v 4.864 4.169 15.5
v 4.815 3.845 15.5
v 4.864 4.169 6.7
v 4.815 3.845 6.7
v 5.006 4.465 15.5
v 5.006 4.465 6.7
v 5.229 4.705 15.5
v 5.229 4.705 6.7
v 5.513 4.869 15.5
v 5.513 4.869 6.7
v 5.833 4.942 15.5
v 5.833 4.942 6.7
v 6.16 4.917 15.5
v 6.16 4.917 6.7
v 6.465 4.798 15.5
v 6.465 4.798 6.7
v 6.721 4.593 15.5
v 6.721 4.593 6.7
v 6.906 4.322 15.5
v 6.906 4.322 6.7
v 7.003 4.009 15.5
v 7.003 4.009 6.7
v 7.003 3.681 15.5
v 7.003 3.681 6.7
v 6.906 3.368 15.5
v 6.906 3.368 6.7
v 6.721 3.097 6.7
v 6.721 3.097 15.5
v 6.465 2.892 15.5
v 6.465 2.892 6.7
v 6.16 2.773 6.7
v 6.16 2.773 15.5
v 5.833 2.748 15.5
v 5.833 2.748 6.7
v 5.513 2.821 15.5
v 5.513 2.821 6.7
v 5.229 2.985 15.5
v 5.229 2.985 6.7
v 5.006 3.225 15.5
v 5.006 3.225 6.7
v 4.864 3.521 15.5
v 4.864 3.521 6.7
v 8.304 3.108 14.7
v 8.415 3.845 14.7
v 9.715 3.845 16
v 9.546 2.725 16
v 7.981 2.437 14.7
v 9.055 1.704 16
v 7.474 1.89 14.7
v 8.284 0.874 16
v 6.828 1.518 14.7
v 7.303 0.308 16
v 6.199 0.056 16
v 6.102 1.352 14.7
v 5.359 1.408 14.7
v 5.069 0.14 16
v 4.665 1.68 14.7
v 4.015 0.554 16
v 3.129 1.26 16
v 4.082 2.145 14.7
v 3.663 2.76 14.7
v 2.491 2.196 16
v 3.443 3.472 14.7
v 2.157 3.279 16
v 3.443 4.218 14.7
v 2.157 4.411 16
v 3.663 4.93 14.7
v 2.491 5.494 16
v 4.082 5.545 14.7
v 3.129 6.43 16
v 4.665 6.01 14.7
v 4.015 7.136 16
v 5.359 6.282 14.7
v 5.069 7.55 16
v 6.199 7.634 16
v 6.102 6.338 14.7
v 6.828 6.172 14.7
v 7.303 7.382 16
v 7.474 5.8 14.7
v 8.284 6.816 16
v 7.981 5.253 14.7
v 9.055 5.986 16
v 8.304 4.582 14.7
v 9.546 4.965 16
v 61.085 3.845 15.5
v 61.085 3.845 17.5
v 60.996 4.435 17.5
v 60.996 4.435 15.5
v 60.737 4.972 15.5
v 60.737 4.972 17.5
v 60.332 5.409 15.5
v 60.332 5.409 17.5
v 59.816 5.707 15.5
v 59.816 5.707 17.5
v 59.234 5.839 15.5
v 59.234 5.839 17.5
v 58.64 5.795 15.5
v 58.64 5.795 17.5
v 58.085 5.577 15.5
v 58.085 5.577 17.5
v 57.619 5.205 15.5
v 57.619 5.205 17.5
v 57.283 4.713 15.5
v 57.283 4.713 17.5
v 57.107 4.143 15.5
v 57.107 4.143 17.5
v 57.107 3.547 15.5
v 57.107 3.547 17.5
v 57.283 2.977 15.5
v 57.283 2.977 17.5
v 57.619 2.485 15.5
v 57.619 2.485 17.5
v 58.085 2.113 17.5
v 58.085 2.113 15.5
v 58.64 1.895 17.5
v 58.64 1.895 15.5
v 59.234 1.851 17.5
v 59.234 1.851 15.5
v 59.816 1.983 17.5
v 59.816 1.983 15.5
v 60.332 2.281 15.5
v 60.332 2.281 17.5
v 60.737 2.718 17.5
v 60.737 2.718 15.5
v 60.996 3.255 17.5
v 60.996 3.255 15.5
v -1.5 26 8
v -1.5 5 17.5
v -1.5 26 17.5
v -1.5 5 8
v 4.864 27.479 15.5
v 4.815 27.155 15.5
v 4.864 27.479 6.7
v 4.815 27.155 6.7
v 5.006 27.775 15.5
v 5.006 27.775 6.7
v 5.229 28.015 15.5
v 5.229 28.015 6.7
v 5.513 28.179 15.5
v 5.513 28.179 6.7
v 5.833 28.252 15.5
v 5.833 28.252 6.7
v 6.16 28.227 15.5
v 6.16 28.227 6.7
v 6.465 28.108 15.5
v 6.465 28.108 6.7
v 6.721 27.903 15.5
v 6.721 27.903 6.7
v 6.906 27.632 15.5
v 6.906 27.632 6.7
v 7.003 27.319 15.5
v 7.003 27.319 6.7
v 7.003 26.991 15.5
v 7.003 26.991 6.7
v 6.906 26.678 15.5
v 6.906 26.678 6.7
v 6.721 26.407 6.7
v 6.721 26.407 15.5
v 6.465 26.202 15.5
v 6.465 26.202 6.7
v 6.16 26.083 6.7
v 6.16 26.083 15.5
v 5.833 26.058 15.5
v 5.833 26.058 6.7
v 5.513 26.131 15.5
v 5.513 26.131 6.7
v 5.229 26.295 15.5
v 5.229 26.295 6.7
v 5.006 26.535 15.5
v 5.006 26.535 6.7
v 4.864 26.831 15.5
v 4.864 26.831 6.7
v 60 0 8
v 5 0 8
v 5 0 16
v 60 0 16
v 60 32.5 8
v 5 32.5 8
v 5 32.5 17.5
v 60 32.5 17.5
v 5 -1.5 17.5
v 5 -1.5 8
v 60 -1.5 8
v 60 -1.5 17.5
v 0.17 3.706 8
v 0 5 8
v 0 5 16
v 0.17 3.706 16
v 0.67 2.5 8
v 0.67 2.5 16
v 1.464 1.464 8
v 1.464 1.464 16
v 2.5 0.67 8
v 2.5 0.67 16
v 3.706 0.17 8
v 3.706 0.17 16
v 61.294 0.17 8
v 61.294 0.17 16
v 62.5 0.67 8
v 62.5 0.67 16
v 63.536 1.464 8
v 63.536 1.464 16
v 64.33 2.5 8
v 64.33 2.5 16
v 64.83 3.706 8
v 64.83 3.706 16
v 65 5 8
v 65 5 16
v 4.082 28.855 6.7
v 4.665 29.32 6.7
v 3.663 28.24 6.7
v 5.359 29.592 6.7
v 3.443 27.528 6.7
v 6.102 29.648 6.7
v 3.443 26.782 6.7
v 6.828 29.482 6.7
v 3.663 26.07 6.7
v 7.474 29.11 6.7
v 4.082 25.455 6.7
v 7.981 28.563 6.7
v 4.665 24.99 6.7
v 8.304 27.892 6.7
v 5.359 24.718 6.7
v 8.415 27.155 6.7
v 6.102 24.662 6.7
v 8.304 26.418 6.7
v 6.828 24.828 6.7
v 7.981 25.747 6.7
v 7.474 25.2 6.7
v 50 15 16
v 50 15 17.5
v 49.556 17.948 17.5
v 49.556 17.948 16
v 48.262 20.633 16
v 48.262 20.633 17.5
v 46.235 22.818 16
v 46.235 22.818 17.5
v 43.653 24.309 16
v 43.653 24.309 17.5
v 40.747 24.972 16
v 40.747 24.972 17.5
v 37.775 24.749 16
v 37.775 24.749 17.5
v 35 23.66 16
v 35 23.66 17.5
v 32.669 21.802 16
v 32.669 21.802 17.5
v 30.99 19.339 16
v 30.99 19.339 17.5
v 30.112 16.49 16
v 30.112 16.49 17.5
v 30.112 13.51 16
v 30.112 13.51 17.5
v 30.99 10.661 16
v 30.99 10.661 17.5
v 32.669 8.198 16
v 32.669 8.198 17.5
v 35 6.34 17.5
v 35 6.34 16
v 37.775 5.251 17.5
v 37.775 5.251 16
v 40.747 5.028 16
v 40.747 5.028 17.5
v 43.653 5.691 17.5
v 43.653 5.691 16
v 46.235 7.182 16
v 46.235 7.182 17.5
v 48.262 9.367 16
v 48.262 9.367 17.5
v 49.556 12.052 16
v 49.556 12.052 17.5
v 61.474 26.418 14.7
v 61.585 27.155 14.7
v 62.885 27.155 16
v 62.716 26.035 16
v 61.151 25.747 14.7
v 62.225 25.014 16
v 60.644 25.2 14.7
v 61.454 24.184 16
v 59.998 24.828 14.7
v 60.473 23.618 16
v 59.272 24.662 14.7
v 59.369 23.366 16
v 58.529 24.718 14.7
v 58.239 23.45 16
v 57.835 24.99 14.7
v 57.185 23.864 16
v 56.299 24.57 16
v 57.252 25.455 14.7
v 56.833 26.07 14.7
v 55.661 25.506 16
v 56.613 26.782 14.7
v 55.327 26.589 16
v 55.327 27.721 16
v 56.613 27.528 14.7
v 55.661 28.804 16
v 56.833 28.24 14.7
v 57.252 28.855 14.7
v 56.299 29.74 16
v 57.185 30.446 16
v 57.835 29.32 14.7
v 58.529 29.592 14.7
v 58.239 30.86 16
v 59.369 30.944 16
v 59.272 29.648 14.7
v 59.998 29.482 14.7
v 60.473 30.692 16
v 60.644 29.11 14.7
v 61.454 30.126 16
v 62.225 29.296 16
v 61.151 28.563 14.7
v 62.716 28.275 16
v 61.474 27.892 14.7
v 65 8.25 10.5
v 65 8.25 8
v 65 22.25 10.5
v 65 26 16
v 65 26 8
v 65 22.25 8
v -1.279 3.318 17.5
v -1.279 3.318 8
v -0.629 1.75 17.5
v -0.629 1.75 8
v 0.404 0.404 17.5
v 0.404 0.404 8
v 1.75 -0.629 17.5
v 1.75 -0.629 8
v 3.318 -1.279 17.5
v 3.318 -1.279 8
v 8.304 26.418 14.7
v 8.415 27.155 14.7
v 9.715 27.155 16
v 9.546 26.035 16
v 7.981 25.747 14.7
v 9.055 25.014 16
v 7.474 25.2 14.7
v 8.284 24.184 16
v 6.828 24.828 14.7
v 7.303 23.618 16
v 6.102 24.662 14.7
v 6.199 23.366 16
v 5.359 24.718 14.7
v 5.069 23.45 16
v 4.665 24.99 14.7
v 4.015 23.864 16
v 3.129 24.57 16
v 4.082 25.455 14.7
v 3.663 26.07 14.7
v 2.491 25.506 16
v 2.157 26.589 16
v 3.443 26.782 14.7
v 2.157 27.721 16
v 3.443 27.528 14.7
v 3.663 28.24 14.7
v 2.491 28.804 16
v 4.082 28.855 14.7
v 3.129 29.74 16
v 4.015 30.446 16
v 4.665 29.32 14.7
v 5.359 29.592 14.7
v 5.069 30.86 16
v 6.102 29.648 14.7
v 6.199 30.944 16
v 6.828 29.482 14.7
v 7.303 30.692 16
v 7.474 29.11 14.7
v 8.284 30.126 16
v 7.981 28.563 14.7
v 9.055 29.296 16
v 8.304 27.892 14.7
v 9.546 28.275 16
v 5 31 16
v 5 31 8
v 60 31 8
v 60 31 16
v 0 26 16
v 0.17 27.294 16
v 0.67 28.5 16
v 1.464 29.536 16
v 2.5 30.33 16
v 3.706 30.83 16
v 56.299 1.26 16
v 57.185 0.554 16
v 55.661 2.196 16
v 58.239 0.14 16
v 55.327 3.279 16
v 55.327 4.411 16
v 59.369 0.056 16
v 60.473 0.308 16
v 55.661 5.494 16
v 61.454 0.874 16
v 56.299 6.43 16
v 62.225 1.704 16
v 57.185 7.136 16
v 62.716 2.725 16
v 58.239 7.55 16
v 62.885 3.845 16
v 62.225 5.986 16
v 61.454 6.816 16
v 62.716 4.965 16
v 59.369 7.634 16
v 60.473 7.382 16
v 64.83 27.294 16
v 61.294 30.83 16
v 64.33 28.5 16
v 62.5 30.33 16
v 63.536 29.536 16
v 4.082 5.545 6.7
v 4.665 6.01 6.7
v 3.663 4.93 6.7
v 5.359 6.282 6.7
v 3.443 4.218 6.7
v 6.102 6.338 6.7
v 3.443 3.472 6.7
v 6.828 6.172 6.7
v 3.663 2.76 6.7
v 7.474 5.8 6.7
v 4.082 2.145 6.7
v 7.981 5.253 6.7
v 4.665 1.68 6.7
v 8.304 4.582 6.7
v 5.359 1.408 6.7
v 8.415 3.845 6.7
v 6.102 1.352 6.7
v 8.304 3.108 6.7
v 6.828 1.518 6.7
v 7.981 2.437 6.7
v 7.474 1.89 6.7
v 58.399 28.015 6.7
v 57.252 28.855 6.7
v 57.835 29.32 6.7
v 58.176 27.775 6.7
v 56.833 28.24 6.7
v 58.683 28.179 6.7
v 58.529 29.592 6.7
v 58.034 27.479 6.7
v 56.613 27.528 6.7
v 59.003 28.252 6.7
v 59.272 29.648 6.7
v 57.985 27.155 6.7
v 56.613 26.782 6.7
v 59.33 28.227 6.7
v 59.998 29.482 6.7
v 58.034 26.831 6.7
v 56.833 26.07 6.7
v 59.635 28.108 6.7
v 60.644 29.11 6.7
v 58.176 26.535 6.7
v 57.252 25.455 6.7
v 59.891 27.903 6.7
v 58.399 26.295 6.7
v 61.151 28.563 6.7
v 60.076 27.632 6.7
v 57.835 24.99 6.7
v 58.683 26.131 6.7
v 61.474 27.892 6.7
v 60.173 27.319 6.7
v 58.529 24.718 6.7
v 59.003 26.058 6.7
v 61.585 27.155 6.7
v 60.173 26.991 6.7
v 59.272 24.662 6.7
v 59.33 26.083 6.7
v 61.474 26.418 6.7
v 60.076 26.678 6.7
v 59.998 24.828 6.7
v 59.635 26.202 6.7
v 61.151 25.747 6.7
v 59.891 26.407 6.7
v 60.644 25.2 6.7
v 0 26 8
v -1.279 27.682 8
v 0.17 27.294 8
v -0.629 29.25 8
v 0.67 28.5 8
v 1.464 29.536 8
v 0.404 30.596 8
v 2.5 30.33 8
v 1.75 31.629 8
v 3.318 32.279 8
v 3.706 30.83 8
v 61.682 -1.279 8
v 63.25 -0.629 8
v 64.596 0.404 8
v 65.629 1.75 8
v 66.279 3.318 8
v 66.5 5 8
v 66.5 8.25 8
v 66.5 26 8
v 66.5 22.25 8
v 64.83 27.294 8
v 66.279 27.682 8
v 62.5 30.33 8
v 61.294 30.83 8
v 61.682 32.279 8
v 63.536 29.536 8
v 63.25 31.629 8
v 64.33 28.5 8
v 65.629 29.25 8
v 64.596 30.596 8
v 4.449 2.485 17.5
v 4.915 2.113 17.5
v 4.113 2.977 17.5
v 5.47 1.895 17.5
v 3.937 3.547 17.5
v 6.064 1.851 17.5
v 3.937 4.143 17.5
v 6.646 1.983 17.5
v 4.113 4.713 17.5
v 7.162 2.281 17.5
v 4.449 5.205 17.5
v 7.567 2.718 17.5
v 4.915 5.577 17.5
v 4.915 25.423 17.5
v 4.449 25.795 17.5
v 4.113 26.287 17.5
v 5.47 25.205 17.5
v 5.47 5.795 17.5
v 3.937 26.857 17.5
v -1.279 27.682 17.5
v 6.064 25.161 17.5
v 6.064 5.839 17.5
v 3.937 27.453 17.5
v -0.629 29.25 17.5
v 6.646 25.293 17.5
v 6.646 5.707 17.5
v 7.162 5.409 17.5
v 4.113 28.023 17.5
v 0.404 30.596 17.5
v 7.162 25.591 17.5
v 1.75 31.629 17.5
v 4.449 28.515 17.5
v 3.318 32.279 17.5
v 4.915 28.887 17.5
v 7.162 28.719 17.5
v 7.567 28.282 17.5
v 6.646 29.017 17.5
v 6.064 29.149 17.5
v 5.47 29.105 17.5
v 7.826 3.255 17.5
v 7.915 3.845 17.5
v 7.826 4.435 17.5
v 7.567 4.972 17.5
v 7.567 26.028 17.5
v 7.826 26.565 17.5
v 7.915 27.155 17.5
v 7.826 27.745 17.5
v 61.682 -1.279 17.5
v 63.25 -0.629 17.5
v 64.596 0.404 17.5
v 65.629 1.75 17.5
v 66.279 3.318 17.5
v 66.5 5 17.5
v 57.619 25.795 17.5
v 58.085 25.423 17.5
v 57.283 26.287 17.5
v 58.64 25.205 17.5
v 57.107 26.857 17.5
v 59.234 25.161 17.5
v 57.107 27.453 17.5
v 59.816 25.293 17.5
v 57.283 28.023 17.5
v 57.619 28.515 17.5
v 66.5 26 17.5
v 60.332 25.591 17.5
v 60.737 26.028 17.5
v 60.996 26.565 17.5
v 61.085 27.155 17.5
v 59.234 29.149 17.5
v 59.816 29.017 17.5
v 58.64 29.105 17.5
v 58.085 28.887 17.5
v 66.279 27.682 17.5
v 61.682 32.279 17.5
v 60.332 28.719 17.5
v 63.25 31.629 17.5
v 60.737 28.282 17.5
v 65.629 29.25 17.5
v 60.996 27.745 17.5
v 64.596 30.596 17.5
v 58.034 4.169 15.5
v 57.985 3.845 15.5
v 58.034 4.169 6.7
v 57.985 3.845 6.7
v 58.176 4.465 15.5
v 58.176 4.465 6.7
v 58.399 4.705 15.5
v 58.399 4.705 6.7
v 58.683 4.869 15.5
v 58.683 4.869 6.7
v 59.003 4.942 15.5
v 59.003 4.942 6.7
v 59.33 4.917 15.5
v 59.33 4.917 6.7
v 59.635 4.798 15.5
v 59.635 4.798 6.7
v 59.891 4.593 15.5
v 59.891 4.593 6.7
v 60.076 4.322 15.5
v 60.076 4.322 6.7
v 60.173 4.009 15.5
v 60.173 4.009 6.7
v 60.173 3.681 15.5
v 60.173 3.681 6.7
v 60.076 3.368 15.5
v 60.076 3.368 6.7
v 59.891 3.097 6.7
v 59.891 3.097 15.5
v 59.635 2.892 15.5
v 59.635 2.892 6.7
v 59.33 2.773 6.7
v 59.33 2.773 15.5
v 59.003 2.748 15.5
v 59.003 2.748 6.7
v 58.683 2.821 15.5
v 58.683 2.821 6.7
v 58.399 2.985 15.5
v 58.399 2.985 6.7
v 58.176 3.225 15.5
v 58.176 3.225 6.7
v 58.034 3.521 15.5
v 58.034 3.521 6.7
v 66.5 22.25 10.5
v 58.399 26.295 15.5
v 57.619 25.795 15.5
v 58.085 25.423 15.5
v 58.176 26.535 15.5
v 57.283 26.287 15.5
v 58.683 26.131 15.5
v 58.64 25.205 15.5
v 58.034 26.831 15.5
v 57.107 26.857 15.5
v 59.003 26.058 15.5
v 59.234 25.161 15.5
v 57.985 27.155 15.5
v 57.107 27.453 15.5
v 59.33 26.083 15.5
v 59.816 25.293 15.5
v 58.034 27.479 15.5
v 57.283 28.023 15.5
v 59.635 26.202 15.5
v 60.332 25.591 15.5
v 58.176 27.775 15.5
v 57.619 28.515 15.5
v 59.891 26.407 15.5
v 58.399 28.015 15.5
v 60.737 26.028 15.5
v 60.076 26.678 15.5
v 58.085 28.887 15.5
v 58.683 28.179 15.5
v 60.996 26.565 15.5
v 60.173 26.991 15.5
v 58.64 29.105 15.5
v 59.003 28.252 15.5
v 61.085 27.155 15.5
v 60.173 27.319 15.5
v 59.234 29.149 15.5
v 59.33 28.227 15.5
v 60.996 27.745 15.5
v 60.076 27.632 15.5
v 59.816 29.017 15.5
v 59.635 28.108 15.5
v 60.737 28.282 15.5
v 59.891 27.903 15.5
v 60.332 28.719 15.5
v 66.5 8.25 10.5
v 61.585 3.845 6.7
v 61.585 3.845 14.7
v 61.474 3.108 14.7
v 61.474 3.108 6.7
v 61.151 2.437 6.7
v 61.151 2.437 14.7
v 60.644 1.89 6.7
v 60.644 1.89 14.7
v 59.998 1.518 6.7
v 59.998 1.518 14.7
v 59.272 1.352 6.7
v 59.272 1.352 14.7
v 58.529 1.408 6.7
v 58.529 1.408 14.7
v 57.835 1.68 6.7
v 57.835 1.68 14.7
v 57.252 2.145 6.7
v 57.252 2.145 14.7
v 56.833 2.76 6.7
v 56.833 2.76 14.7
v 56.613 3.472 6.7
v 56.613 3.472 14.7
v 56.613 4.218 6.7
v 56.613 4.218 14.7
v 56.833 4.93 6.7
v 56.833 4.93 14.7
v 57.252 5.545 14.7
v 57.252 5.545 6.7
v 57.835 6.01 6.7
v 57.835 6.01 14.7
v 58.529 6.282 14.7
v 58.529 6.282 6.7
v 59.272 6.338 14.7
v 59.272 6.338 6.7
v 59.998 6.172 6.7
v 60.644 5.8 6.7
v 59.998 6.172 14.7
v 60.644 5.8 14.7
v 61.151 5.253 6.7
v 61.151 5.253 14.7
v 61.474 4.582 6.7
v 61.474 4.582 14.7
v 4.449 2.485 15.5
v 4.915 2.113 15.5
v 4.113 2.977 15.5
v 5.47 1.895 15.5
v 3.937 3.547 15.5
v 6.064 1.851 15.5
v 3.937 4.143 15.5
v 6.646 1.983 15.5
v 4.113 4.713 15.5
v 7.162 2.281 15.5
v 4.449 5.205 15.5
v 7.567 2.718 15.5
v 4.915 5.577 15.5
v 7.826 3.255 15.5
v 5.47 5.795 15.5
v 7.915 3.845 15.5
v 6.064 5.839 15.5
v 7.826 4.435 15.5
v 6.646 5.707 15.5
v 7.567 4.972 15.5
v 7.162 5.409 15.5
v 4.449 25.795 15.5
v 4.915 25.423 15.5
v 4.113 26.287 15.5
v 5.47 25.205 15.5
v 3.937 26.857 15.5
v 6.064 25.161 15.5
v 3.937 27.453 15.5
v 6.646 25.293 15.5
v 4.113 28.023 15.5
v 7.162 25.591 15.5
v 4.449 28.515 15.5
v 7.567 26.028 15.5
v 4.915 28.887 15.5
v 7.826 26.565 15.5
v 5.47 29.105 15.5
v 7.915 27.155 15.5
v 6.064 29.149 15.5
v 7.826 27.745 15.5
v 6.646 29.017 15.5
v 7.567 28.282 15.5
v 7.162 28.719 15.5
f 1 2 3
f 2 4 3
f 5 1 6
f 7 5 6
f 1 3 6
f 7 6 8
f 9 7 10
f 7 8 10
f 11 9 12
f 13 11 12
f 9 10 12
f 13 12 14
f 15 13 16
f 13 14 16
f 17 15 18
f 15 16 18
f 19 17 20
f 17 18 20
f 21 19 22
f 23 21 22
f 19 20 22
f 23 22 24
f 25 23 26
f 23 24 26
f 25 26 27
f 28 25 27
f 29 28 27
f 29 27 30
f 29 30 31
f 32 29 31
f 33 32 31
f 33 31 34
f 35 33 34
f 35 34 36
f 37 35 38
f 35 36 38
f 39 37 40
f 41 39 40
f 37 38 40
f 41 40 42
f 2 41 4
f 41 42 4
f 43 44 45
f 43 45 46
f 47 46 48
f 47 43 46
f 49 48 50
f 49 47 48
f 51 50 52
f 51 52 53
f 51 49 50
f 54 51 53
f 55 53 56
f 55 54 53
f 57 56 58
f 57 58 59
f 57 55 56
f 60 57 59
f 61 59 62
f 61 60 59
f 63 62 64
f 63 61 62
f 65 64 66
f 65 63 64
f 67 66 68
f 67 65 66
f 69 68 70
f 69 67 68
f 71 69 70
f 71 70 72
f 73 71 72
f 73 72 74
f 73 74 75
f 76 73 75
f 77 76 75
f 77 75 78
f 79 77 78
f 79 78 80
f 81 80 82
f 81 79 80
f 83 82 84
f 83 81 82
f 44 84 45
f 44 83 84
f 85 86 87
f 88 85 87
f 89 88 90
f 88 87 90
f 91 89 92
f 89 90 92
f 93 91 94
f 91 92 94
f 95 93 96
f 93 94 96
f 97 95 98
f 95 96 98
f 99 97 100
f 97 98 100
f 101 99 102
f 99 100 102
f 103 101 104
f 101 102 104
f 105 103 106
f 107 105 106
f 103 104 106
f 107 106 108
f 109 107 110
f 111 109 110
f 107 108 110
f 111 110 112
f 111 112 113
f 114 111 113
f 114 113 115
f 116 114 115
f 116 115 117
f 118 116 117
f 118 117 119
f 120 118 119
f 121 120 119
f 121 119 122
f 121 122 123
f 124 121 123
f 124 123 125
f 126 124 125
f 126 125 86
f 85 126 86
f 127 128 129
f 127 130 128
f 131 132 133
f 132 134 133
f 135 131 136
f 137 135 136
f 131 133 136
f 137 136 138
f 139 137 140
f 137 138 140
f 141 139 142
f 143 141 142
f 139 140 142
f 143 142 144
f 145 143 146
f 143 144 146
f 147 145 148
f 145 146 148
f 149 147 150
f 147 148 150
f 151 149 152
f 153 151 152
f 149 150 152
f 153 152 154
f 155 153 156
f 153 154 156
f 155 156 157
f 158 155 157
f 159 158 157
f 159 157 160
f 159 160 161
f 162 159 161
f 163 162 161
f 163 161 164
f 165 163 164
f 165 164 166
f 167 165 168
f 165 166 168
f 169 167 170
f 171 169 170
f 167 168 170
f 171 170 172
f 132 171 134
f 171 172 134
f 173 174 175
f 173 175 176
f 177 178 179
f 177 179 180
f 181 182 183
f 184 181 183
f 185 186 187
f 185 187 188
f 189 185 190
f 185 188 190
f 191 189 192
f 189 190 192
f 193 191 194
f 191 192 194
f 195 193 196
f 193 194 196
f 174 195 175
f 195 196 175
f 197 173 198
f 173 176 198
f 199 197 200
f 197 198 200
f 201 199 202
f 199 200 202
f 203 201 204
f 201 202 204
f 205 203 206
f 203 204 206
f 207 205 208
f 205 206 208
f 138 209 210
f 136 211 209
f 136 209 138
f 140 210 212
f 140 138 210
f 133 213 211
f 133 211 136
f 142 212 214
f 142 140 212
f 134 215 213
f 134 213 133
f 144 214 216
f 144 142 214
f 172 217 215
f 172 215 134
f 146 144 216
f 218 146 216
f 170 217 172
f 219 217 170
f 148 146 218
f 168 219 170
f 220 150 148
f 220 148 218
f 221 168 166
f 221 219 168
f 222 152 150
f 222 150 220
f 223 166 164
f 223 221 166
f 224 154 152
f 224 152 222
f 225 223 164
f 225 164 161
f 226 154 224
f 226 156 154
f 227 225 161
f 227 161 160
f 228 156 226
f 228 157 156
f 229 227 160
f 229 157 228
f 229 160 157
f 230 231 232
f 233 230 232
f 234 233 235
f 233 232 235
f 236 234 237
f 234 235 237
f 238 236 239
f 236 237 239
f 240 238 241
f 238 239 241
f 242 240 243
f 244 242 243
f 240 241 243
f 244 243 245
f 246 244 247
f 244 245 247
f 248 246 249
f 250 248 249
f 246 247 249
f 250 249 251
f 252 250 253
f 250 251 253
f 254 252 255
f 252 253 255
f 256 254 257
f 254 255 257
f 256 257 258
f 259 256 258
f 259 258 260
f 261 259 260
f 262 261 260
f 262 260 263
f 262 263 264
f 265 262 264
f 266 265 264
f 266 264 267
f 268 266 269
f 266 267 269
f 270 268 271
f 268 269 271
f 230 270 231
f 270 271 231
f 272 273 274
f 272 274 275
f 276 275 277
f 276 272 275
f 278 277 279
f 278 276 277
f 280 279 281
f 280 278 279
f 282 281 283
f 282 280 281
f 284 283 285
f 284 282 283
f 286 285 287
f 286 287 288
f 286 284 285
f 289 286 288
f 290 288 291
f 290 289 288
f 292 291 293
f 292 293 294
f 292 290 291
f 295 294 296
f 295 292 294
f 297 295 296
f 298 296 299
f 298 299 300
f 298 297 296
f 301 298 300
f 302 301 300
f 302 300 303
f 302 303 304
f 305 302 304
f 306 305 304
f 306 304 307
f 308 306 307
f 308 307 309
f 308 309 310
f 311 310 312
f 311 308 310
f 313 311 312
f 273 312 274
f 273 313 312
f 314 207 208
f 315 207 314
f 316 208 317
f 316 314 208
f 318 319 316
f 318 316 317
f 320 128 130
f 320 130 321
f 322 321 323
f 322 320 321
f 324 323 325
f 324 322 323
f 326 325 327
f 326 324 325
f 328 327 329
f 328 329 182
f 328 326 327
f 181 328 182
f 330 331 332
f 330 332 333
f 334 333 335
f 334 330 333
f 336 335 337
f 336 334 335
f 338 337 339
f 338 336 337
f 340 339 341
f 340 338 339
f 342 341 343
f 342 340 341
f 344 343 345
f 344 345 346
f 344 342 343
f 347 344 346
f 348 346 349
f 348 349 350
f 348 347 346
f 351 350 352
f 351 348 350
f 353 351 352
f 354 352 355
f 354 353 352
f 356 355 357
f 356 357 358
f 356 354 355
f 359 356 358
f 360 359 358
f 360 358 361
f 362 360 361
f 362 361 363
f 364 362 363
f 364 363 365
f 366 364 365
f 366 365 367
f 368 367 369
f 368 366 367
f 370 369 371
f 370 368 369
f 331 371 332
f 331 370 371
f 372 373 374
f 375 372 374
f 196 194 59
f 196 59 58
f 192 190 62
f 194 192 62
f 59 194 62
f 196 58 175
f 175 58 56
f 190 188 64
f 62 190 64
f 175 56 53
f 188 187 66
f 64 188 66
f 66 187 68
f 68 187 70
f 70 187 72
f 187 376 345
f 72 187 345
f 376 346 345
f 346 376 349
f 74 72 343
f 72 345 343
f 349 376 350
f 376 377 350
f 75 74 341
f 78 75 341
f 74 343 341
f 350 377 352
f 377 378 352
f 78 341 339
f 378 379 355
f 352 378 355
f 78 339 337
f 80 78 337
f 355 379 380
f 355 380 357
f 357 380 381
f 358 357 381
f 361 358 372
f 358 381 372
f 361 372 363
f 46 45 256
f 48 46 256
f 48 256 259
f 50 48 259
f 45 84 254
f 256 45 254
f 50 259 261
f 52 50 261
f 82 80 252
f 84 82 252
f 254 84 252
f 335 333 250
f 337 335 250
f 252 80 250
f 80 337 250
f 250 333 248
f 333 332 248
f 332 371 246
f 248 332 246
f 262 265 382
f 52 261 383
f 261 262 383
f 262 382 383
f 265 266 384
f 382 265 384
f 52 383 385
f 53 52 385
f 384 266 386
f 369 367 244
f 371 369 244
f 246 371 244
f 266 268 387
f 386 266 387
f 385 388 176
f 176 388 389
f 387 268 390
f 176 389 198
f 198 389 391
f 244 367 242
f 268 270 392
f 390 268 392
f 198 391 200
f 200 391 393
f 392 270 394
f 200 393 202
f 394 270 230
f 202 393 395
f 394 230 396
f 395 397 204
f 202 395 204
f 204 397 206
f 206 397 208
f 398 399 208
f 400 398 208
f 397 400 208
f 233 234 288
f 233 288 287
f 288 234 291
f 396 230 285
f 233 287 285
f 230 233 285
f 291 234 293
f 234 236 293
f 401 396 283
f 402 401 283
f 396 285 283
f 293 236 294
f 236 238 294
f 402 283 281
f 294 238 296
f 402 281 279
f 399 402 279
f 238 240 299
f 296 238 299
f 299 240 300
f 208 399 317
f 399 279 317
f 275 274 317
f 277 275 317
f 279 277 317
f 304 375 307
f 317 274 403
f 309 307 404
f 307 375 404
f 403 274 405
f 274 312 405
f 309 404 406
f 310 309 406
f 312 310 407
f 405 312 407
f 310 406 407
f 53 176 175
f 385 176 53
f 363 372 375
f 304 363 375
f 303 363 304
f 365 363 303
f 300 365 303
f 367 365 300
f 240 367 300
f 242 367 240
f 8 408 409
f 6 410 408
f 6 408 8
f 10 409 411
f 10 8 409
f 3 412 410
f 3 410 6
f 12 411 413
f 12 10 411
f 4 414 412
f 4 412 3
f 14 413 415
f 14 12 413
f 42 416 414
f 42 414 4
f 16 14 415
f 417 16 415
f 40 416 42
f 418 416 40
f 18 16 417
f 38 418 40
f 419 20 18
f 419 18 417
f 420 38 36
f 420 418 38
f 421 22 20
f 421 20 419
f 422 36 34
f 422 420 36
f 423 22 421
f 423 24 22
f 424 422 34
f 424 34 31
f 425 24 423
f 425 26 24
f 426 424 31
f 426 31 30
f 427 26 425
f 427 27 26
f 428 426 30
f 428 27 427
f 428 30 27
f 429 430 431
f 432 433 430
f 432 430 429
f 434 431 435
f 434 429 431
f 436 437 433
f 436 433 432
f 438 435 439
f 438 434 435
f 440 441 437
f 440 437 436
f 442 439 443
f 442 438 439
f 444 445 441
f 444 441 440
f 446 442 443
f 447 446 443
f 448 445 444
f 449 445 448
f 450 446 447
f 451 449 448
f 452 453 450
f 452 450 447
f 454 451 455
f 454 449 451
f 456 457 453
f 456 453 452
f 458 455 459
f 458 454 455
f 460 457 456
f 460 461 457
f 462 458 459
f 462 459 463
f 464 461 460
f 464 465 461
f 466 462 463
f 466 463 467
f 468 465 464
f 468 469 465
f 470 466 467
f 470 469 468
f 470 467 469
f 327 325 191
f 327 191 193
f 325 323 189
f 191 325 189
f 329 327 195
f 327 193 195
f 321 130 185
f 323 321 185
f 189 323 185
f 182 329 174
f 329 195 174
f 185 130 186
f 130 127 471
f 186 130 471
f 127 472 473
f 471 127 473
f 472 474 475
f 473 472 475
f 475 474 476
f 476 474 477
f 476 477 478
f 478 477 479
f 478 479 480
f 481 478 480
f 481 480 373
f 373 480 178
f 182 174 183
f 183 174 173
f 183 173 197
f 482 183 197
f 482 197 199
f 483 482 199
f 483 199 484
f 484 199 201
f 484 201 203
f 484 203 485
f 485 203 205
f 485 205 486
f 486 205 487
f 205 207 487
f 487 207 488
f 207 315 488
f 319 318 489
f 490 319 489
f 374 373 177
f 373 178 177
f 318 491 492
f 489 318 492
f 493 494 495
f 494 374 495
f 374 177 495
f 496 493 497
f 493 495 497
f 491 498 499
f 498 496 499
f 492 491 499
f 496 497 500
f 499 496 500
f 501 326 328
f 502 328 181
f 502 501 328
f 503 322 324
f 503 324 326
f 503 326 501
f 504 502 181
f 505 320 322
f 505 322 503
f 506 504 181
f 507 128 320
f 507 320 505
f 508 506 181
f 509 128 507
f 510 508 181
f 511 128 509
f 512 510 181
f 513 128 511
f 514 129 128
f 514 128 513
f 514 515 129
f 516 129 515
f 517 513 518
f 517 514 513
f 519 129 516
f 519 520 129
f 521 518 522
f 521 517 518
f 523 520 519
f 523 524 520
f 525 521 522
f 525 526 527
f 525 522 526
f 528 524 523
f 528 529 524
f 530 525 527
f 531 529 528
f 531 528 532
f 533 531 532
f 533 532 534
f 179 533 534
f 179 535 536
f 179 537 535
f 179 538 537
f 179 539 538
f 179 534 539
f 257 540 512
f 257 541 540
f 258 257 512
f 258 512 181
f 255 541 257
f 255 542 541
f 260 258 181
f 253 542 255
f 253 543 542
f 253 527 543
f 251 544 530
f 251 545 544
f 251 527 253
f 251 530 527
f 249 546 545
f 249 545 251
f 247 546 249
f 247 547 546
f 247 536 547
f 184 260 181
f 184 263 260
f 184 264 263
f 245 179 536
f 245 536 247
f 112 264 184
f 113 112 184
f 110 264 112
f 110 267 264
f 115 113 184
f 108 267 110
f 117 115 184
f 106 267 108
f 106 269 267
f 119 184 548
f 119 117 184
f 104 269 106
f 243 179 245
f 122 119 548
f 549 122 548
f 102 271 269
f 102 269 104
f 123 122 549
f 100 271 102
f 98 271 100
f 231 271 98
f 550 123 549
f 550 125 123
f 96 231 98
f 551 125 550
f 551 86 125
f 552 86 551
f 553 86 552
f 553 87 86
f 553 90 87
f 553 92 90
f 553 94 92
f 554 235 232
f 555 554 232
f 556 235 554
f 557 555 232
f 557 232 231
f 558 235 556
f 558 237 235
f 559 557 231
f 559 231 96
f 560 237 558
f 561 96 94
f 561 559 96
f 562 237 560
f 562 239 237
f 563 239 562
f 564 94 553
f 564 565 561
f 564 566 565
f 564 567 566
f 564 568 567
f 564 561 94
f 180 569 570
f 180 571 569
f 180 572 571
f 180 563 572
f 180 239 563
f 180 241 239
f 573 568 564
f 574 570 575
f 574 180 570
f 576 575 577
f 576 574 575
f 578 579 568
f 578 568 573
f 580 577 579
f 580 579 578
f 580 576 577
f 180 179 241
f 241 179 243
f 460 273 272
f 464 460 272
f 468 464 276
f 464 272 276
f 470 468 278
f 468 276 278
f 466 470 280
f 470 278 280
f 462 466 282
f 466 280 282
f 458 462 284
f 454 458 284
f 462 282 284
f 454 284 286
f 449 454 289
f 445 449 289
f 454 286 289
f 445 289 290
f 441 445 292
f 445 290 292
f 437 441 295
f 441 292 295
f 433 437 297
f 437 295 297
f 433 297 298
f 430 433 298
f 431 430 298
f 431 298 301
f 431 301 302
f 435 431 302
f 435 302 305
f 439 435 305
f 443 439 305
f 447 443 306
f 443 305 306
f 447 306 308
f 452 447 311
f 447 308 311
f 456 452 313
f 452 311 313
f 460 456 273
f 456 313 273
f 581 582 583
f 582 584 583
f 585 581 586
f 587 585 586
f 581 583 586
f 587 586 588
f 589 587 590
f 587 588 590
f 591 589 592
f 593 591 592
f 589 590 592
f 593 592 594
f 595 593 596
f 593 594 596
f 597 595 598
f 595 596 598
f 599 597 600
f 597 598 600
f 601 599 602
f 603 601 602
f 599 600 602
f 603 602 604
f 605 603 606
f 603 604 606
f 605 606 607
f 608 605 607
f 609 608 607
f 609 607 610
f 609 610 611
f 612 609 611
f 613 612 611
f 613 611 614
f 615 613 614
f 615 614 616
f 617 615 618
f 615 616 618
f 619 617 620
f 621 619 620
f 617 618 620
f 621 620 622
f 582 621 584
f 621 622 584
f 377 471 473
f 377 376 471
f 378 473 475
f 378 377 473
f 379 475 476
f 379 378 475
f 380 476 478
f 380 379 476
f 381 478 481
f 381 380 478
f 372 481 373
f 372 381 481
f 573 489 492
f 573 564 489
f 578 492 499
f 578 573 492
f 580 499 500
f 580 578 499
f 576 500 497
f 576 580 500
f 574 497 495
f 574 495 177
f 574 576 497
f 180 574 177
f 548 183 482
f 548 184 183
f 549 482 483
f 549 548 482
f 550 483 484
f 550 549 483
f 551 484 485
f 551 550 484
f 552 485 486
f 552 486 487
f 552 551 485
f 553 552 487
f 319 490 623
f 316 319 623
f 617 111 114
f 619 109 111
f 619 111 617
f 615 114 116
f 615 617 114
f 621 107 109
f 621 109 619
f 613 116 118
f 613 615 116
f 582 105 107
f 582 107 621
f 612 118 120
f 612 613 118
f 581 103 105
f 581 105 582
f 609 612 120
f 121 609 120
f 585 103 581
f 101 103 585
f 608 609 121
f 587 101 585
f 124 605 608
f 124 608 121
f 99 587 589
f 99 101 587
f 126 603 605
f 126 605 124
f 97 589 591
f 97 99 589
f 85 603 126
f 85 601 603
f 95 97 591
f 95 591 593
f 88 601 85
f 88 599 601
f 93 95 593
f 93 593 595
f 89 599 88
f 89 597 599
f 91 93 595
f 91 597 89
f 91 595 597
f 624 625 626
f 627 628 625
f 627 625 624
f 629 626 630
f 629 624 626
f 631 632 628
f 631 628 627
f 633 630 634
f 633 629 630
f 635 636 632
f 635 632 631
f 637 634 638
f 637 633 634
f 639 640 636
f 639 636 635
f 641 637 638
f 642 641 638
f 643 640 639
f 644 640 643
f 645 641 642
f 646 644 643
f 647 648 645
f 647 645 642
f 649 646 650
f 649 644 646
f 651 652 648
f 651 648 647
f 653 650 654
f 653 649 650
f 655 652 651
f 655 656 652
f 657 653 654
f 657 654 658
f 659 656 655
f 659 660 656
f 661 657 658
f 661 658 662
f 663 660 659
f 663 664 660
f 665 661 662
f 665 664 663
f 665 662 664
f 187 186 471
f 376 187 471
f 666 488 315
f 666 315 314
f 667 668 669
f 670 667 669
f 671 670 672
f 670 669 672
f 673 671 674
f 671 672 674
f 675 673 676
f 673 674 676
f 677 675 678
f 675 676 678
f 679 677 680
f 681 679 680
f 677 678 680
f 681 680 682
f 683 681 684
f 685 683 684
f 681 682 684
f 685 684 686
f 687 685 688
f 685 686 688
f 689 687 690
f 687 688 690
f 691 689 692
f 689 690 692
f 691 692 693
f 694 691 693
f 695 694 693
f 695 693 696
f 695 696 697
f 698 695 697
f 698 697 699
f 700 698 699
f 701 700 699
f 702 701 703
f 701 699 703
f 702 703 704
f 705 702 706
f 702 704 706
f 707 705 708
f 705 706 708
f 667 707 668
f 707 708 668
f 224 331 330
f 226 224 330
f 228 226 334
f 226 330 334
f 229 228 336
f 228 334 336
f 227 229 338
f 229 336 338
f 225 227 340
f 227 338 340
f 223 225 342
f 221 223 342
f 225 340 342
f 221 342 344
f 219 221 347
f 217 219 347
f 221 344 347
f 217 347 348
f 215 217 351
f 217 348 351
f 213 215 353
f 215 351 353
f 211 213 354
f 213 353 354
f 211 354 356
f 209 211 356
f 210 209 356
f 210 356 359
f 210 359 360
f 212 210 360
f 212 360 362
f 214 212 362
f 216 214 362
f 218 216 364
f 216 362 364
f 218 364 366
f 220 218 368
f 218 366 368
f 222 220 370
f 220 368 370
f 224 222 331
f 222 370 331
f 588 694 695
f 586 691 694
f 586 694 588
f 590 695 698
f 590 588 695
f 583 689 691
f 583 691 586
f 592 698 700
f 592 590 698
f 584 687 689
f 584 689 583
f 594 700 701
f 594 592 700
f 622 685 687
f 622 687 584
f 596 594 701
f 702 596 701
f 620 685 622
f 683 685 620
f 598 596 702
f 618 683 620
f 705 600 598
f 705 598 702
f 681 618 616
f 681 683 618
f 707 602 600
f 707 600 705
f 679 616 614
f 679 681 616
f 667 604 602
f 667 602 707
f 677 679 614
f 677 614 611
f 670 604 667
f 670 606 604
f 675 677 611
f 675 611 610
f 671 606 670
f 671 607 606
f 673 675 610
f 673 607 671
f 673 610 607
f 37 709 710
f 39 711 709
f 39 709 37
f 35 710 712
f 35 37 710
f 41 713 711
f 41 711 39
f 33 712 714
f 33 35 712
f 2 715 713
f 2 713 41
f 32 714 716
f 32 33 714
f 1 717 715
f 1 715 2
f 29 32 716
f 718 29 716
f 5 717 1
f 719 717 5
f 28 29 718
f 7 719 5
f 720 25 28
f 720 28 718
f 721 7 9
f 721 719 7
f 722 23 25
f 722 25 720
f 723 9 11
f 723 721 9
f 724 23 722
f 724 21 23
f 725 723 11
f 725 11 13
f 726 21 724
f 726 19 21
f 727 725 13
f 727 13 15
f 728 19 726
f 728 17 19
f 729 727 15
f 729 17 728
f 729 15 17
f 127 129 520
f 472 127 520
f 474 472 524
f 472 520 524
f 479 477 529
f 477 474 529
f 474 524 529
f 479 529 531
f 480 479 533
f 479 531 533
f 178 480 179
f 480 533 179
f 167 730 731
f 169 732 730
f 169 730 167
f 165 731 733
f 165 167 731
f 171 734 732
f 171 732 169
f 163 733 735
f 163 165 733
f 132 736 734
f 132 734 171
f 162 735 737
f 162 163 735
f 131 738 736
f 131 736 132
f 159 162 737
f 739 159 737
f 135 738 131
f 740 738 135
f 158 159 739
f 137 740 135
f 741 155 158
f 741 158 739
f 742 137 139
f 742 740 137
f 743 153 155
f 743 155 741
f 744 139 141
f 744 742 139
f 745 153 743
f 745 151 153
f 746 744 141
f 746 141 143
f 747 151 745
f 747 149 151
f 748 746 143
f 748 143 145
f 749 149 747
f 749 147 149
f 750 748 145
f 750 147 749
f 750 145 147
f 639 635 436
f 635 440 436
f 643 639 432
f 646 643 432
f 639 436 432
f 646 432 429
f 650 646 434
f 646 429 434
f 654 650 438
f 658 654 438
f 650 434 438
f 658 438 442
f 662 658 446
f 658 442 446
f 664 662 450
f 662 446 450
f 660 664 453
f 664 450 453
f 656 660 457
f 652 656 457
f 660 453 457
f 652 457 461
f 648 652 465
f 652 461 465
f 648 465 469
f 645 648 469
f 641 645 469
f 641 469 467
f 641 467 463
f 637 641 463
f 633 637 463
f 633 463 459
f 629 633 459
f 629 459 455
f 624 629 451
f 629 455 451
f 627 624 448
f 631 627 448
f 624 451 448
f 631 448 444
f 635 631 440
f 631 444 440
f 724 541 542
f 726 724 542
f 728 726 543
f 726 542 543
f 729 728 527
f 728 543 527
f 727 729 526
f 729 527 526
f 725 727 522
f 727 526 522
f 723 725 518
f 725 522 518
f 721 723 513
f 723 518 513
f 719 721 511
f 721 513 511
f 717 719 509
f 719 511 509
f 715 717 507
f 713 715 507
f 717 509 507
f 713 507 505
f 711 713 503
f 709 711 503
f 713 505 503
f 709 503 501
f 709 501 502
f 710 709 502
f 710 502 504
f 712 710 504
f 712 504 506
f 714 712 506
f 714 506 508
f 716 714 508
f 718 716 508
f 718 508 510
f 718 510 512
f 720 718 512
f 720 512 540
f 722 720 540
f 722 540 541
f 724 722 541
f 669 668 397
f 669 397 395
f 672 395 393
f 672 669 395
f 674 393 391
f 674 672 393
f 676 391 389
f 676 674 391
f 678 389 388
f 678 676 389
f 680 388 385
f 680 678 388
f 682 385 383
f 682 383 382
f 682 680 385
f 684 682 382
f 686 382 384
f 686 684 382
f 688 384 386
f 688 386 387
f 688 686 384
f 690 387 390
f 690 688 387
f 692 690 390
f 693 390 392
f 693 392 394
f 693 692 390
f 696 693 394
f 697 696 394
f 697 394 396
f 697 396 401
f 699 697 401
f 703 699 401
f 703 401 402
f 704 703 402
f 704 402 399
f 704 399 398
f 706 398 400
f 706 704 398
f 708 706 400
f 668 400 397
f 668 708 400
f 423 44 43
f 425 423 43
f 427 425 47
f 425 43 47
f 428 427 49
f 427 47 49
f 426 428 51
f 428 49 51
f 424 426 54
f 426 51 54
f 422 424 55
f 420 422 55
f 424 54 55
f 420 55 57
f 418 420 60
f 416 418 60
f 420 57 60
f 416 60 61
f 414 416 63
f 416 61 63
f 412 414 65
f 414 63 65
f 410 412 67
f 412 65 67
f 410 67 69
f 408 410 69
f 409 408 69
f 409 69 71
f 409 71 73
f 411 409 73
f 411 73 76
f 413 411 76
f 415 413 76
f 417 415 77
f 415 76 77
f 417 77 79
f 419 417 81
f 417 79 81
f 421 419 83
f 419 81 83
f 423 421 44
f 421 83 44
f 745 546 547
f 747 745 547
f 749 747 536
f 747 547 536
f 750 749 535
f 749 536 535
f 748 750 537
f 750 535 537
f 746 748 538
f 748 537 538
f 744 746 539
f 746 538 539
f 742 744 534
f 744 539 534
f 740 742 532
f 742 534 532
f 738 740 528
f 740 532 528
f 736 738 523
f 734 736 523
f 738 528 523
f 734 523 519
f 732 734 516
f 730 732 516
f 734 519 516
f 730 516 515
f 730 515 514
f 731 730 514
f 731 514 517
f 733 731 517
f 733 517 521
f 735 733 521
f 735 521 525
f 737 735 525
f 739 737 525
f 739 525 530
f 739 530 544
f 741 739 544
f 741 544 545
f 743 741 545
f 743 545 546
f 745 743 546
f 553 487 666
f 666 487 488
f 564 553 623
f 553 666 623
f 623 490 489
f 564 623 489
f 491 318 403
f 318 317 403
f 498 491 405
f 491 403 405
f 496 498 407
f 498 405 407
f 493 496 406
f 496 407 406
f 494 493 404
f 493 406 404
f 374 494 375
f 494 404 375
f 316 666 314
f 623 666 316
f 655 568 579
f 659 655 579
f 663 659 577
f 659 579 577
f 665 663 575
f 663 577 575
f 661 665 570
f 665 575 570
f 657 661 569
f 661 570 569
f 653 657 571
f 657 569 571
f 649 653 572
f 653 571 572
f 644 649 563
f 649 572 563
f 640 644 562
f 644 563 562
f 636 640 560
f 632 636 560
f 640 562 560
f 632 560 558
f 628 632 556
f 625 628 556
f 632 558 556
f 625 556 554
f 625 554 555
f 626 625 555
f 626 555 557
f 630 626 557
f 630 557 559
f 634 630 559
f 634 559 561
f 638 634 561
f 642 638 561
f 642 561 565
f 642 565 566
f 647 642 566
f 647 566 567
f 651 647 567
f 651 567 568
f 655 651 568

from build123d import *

# Parameters (mm, degrees)
BOX001_W         = 65
BOX001_H         = 31
BOX001_DEPTH     = 8
FILLET001_R      = 5
THICKNESS001_T   = 1.5
SKETCH002_W      = 14
SKETCH002_H      = 2.5
POCKET001_DEPTH  = 1.5
SKETCH003_R      = 2.5
PAD001_DEPTH     = 9.3
HOLE_D           = 2.2
HOLE_CBORE_D     = 4
HOLE_CBORE_DEPTH = 2
SKETCH005_R      = 10
POCKET002_DEPTH  = 1.5
CHAMFER_SIZE     = 1.3


with BuildPart() as part:
    # Box001 → Box001 (join)
    with BuildSketch(Plane.XY.offset(8)):
        with Locations((32.5, 15.5)):
            Rectangle(BOX001_W, BOX001_H)
    extrude(amount=BOX001_DEPTH)

    # Fillet001
    fillet001_edges = [part.edges().sort_by_distance(p)[0] for p in [
        (65, 0, 12),
        (65, 31, 12),
        (0, 0, 12),
        (0, 31, 12),
    ]]
    fillet(fillet001_edges, radius=FILLET001_R)

    # Thickness001
    thickness001_openings = [part.faces().sort_by_distance(p)[0] for p in [
        (32.5, 15.5, 8),
    ]]
    offset(amount=THICKNESS001_T, openings=thickness001_openings, kind=Kind.INTERSECTION)

    # Sketch002 (on Face19 of Thickness001) → Pocket001 (cut)
    with BuildSketch(Plane.YZ.offset(66.5)):
        with Locations((15.25, 9.25)):
            Rectangle(SKETCH002_W, SKETCH002_H)
    extrude(amount=-POCKET001_DEPTH, mode=Mode.SUBTRACT)

    # Sketch003 (on Face2 of Pocket001) → Pad001 (join)
    with BuildSketch(Plane(origin=(0, 0, 16), x_dir=(1, 0, 0), z_dir=(0, 0, -1))):
        with Locations((59.085, -3.845)):
            Circle(SKETCH003_R)
        with Locations((59.085, -27.155)):
            Circle(SKETCH003_R)
        with Locations((5.915, -27.155)):
            Circle(SKETCH003_R)
        with Locations((5.915, -3.845)):
            Circle(SKETCH003_R)
    extrude(amount=PAD001_DEPTH)

    # Hole (through all)
    with Locations(Plane.XY.offset(17.5)):
        with Locations((5.915, 27.155), (59.085, 27.155), (59.085, 3.845), (5.915, 3.845)):
            CounterBoreHole(HOLE_D / 2, HOLE_CBORE_D / 2, HOLE_CBORE_DEPTH)

    # Sketch005 (on Face30 of Hole) → Pocket002 (cut)
    with BuildSketch(Plane.XY.offset(17.5)):
        with Locations((40, 15)):
            Circle(SKETCH005_R)
    extrude(amount=-POCKET002_DEPTH, mode=Mode.SUBTRACT)

    # Chamfer
    chamfer_edges = [part.edges().sort_by_distance(p)[0] for p in [
        (56.585, 3.845, 16),
        (56.585, 27.155, 16),
        (3.415, 3.845, 16),
        (3.415, 27.155, 16),
    ]]
    chamfer(chamfer_edges, length=CHAMFER_SIZE)


solid = part.part
